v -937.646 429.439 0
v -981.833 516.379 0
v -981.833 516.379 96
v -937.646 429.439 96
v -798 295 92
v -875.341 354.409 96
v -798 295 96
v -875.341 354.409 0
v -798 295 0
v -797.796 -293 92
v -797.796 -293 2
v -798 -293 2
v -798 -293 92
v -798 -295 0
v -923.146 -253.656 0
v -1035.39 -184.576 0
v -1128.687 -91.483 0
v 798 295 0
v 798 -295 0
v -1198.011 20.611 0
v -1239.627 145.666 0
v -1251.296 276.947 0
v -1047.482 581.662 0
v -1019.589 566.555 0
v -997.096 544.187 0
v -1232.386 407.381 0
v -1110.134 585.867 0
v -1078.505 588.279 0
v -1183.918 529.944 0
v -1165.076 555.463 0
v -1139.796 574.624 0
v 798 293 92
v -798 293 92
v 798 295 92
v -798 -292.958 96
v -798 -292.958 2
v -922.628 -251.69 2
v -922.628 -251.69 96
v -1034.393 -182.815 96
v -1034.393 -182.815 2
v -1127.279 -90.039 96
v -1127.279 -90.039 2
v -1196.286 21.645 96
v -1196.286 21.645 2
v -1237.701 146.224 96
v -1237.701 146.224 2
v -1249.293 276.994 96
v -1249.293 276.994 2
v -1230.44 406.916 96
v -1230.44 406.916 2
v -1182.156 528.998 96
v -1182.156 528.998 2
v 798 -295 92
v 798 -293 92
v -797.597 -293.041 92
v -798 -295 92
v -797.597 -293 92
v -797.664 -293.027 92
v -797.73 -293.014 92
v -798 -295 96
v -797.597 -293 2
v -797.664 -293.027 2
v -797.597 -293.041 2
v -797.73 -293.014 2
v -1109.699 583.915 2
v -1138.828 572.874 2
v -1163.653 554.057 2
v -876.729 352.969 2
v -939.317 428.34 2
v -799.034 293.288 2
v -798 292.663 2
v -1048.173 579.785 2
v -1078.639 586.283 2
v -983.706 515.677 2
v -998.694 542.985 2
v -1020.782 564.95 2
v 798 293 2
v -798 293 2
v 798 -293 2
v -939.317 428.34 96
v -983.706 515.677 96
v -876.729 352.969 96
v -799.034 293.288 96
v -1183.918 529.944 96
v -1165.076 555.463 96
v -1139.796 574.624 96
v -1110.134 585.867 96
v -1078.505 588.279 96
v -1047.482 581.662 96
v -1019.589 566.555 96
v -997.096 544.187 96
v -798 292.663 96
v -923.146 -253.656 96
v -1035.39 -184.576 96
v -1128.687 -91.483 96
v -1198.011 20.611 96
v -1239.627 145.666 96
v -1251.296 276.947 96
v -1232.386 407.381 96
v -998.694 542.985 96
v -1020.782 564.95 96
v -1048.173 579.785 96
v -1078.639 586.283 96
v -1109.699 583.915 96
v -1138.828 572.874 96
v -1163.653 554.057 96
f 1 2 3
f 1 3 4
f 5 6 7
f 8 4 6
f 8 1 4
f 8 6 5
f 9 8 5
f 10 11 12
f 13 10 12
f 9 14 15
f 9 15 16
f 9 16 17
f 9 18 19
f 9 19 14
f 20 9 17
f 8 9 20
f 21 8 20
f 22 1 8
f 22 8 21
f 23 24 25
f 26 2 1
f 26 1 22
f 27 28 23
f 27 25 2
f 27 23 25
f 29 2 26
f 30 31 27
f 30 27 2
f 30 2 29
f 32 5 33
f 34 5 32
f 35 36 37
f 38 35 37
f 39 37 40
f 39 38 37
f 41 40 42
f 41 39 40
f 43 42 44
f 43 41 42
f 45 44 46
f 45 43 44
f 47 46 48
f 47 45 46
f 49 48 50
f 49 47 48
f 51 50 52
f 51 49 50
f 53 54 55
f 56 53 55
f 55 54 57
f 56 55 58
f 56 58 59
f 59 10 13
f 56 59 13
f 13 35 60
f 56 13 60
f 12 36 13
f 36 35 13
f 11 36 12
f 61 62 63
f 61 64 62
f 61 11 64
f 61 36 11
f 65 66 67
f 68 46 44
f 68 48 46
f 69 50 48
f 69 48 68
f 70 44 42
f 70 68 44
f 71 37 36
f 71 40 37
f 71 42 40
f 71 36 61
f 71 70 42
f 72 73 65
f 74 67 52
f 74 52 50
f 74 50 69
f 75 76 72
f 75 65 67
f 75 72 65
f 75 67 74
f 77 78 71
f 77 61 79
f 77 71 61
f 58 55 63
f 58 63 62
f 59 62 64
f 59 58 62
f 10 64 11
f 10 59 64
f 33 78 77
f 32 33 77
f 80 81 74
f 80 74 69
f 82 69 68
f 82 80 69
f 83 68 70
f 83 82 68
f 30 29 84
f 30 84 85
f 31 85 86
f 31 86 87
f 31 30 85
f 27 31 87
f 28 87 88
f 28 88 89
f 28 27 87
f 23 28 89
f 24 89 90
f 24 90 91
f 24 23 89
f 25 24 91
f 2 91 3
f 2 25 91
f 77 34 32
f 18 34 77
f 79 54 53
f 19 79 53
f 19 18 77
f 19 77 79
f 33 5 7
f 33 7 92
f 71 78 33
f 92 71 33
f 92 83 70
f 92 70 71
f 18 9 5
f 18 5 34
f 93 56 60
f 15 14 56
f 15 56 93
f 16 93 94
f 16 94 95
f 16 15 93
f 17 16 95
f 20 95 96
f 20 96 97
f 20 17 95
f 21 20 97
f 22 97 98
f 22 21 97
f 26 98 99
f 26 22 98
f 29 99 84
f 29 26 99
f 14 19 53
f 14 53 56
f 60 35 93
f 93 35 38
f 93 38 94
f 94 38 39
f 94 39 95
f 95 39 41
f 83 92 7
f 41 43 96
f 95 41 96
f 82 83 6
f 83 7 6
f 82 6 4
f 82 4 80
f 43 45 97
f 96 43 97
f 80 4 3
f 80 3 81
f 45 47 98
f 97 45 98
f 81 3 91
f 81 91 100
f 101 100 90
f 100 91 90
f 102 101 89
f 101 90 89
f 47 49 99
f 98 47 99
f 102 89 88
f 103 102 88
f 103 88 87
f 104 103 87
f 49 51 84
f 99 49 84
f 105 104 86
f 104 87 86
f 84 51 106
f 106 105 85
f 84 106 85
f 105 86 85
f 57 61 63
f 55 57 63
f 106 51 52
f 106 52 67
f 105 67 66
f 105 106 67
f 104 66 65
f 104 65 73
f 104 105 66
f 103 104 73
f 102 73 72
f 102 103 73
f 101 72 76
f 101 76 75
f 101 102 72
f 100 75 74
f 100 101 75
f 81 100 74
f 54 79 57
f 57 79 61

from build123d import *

# Parameters (mm, degrees)
SKETCH_1_W          = 1596
SKETCH_1_H          = 590
EXTRUDE_1_DEPTH     = 2
EXTRUDE_2_DEPTH     = 90
EXTRUDE_5_DEPTH     = 96
CUT_EXTRUDE_1_DEPTH = 94


with BuildPart() as part:
    # 草图1 → 凸台-拉伸1 (new body)
    with BuildSketch(Plane.XY):
        Rectangle(SKETCH_1_W, SKETCH_1_H)
    extrude(amount=EXTRUDE_1_DEPTH)

    # 草图2 → 凸台-拉伸2 (add)
    with BuildSketch(Plane.XY.offset(2)):
        Polygon((-798, -293), (796, -293), (798, -293), (798, -295), (-798, -295), align=None)
        Polygon((796, 293), (798, 293), (798, 295), (-798, 295), (-798, 293), align=None)
    extrude(amount=EXTRUDE_2_DEPTH)

    # 草图5 → 凸台-拉伸5 (add)
    with BuildSketch(Plane(origin=(0, 0, 0), x_dir=(-1, 0, 0), z_dir=(0, 0, -1))):
        with BuildLine():
            Line((798, 295), (798, -295))
            ThreePointArc((798, -295), (1198.010532784, 20.610905531), (1183.918362251, 529.943881843))
            ThreePointArc((1183.918362251, 529.943881843), (1078.504933407, 588.278536691), (981.833490458, 516.378918785))
            ThreePointArc((981.833490458, 516.378918785), (908.585128619, 390.187197034), (798, 295))
        make_face()
    extrude(amount=-EXTRUDE_5_DEPTH)

    # 草图6 → 切除-拉伸1 (cut)
    with BuildSketch(Plane.XY.offset(96)):
        with BuildLine():
            Line((-797.998398705, 292.662145907), (-797.597225993, -293.040976493))
            ThreePointArc((-797.597225993, -293.040976493), (-1196.198962172, 21.458379377), (-1182.156422838, 528.997536503))
            ThreePointArc((-1182.156422838, 528.997536503), (-1078.638882134, 586.283027298), (-983.706100418, 515.67654286))
            ThreePointArc((-983.706100418, 515.67654286), (-910.123787085, 388.909492011), (-799.034482428, 293.288320677))
            Line((-799.034482428, 293.288320677), (-797.998398705, 292.662145907))
        make_face()
    extrude(amount=-CUT_EXTRUDE_1_DEPTH, mode=Mode.SUBTRACT)


solid = part.part
